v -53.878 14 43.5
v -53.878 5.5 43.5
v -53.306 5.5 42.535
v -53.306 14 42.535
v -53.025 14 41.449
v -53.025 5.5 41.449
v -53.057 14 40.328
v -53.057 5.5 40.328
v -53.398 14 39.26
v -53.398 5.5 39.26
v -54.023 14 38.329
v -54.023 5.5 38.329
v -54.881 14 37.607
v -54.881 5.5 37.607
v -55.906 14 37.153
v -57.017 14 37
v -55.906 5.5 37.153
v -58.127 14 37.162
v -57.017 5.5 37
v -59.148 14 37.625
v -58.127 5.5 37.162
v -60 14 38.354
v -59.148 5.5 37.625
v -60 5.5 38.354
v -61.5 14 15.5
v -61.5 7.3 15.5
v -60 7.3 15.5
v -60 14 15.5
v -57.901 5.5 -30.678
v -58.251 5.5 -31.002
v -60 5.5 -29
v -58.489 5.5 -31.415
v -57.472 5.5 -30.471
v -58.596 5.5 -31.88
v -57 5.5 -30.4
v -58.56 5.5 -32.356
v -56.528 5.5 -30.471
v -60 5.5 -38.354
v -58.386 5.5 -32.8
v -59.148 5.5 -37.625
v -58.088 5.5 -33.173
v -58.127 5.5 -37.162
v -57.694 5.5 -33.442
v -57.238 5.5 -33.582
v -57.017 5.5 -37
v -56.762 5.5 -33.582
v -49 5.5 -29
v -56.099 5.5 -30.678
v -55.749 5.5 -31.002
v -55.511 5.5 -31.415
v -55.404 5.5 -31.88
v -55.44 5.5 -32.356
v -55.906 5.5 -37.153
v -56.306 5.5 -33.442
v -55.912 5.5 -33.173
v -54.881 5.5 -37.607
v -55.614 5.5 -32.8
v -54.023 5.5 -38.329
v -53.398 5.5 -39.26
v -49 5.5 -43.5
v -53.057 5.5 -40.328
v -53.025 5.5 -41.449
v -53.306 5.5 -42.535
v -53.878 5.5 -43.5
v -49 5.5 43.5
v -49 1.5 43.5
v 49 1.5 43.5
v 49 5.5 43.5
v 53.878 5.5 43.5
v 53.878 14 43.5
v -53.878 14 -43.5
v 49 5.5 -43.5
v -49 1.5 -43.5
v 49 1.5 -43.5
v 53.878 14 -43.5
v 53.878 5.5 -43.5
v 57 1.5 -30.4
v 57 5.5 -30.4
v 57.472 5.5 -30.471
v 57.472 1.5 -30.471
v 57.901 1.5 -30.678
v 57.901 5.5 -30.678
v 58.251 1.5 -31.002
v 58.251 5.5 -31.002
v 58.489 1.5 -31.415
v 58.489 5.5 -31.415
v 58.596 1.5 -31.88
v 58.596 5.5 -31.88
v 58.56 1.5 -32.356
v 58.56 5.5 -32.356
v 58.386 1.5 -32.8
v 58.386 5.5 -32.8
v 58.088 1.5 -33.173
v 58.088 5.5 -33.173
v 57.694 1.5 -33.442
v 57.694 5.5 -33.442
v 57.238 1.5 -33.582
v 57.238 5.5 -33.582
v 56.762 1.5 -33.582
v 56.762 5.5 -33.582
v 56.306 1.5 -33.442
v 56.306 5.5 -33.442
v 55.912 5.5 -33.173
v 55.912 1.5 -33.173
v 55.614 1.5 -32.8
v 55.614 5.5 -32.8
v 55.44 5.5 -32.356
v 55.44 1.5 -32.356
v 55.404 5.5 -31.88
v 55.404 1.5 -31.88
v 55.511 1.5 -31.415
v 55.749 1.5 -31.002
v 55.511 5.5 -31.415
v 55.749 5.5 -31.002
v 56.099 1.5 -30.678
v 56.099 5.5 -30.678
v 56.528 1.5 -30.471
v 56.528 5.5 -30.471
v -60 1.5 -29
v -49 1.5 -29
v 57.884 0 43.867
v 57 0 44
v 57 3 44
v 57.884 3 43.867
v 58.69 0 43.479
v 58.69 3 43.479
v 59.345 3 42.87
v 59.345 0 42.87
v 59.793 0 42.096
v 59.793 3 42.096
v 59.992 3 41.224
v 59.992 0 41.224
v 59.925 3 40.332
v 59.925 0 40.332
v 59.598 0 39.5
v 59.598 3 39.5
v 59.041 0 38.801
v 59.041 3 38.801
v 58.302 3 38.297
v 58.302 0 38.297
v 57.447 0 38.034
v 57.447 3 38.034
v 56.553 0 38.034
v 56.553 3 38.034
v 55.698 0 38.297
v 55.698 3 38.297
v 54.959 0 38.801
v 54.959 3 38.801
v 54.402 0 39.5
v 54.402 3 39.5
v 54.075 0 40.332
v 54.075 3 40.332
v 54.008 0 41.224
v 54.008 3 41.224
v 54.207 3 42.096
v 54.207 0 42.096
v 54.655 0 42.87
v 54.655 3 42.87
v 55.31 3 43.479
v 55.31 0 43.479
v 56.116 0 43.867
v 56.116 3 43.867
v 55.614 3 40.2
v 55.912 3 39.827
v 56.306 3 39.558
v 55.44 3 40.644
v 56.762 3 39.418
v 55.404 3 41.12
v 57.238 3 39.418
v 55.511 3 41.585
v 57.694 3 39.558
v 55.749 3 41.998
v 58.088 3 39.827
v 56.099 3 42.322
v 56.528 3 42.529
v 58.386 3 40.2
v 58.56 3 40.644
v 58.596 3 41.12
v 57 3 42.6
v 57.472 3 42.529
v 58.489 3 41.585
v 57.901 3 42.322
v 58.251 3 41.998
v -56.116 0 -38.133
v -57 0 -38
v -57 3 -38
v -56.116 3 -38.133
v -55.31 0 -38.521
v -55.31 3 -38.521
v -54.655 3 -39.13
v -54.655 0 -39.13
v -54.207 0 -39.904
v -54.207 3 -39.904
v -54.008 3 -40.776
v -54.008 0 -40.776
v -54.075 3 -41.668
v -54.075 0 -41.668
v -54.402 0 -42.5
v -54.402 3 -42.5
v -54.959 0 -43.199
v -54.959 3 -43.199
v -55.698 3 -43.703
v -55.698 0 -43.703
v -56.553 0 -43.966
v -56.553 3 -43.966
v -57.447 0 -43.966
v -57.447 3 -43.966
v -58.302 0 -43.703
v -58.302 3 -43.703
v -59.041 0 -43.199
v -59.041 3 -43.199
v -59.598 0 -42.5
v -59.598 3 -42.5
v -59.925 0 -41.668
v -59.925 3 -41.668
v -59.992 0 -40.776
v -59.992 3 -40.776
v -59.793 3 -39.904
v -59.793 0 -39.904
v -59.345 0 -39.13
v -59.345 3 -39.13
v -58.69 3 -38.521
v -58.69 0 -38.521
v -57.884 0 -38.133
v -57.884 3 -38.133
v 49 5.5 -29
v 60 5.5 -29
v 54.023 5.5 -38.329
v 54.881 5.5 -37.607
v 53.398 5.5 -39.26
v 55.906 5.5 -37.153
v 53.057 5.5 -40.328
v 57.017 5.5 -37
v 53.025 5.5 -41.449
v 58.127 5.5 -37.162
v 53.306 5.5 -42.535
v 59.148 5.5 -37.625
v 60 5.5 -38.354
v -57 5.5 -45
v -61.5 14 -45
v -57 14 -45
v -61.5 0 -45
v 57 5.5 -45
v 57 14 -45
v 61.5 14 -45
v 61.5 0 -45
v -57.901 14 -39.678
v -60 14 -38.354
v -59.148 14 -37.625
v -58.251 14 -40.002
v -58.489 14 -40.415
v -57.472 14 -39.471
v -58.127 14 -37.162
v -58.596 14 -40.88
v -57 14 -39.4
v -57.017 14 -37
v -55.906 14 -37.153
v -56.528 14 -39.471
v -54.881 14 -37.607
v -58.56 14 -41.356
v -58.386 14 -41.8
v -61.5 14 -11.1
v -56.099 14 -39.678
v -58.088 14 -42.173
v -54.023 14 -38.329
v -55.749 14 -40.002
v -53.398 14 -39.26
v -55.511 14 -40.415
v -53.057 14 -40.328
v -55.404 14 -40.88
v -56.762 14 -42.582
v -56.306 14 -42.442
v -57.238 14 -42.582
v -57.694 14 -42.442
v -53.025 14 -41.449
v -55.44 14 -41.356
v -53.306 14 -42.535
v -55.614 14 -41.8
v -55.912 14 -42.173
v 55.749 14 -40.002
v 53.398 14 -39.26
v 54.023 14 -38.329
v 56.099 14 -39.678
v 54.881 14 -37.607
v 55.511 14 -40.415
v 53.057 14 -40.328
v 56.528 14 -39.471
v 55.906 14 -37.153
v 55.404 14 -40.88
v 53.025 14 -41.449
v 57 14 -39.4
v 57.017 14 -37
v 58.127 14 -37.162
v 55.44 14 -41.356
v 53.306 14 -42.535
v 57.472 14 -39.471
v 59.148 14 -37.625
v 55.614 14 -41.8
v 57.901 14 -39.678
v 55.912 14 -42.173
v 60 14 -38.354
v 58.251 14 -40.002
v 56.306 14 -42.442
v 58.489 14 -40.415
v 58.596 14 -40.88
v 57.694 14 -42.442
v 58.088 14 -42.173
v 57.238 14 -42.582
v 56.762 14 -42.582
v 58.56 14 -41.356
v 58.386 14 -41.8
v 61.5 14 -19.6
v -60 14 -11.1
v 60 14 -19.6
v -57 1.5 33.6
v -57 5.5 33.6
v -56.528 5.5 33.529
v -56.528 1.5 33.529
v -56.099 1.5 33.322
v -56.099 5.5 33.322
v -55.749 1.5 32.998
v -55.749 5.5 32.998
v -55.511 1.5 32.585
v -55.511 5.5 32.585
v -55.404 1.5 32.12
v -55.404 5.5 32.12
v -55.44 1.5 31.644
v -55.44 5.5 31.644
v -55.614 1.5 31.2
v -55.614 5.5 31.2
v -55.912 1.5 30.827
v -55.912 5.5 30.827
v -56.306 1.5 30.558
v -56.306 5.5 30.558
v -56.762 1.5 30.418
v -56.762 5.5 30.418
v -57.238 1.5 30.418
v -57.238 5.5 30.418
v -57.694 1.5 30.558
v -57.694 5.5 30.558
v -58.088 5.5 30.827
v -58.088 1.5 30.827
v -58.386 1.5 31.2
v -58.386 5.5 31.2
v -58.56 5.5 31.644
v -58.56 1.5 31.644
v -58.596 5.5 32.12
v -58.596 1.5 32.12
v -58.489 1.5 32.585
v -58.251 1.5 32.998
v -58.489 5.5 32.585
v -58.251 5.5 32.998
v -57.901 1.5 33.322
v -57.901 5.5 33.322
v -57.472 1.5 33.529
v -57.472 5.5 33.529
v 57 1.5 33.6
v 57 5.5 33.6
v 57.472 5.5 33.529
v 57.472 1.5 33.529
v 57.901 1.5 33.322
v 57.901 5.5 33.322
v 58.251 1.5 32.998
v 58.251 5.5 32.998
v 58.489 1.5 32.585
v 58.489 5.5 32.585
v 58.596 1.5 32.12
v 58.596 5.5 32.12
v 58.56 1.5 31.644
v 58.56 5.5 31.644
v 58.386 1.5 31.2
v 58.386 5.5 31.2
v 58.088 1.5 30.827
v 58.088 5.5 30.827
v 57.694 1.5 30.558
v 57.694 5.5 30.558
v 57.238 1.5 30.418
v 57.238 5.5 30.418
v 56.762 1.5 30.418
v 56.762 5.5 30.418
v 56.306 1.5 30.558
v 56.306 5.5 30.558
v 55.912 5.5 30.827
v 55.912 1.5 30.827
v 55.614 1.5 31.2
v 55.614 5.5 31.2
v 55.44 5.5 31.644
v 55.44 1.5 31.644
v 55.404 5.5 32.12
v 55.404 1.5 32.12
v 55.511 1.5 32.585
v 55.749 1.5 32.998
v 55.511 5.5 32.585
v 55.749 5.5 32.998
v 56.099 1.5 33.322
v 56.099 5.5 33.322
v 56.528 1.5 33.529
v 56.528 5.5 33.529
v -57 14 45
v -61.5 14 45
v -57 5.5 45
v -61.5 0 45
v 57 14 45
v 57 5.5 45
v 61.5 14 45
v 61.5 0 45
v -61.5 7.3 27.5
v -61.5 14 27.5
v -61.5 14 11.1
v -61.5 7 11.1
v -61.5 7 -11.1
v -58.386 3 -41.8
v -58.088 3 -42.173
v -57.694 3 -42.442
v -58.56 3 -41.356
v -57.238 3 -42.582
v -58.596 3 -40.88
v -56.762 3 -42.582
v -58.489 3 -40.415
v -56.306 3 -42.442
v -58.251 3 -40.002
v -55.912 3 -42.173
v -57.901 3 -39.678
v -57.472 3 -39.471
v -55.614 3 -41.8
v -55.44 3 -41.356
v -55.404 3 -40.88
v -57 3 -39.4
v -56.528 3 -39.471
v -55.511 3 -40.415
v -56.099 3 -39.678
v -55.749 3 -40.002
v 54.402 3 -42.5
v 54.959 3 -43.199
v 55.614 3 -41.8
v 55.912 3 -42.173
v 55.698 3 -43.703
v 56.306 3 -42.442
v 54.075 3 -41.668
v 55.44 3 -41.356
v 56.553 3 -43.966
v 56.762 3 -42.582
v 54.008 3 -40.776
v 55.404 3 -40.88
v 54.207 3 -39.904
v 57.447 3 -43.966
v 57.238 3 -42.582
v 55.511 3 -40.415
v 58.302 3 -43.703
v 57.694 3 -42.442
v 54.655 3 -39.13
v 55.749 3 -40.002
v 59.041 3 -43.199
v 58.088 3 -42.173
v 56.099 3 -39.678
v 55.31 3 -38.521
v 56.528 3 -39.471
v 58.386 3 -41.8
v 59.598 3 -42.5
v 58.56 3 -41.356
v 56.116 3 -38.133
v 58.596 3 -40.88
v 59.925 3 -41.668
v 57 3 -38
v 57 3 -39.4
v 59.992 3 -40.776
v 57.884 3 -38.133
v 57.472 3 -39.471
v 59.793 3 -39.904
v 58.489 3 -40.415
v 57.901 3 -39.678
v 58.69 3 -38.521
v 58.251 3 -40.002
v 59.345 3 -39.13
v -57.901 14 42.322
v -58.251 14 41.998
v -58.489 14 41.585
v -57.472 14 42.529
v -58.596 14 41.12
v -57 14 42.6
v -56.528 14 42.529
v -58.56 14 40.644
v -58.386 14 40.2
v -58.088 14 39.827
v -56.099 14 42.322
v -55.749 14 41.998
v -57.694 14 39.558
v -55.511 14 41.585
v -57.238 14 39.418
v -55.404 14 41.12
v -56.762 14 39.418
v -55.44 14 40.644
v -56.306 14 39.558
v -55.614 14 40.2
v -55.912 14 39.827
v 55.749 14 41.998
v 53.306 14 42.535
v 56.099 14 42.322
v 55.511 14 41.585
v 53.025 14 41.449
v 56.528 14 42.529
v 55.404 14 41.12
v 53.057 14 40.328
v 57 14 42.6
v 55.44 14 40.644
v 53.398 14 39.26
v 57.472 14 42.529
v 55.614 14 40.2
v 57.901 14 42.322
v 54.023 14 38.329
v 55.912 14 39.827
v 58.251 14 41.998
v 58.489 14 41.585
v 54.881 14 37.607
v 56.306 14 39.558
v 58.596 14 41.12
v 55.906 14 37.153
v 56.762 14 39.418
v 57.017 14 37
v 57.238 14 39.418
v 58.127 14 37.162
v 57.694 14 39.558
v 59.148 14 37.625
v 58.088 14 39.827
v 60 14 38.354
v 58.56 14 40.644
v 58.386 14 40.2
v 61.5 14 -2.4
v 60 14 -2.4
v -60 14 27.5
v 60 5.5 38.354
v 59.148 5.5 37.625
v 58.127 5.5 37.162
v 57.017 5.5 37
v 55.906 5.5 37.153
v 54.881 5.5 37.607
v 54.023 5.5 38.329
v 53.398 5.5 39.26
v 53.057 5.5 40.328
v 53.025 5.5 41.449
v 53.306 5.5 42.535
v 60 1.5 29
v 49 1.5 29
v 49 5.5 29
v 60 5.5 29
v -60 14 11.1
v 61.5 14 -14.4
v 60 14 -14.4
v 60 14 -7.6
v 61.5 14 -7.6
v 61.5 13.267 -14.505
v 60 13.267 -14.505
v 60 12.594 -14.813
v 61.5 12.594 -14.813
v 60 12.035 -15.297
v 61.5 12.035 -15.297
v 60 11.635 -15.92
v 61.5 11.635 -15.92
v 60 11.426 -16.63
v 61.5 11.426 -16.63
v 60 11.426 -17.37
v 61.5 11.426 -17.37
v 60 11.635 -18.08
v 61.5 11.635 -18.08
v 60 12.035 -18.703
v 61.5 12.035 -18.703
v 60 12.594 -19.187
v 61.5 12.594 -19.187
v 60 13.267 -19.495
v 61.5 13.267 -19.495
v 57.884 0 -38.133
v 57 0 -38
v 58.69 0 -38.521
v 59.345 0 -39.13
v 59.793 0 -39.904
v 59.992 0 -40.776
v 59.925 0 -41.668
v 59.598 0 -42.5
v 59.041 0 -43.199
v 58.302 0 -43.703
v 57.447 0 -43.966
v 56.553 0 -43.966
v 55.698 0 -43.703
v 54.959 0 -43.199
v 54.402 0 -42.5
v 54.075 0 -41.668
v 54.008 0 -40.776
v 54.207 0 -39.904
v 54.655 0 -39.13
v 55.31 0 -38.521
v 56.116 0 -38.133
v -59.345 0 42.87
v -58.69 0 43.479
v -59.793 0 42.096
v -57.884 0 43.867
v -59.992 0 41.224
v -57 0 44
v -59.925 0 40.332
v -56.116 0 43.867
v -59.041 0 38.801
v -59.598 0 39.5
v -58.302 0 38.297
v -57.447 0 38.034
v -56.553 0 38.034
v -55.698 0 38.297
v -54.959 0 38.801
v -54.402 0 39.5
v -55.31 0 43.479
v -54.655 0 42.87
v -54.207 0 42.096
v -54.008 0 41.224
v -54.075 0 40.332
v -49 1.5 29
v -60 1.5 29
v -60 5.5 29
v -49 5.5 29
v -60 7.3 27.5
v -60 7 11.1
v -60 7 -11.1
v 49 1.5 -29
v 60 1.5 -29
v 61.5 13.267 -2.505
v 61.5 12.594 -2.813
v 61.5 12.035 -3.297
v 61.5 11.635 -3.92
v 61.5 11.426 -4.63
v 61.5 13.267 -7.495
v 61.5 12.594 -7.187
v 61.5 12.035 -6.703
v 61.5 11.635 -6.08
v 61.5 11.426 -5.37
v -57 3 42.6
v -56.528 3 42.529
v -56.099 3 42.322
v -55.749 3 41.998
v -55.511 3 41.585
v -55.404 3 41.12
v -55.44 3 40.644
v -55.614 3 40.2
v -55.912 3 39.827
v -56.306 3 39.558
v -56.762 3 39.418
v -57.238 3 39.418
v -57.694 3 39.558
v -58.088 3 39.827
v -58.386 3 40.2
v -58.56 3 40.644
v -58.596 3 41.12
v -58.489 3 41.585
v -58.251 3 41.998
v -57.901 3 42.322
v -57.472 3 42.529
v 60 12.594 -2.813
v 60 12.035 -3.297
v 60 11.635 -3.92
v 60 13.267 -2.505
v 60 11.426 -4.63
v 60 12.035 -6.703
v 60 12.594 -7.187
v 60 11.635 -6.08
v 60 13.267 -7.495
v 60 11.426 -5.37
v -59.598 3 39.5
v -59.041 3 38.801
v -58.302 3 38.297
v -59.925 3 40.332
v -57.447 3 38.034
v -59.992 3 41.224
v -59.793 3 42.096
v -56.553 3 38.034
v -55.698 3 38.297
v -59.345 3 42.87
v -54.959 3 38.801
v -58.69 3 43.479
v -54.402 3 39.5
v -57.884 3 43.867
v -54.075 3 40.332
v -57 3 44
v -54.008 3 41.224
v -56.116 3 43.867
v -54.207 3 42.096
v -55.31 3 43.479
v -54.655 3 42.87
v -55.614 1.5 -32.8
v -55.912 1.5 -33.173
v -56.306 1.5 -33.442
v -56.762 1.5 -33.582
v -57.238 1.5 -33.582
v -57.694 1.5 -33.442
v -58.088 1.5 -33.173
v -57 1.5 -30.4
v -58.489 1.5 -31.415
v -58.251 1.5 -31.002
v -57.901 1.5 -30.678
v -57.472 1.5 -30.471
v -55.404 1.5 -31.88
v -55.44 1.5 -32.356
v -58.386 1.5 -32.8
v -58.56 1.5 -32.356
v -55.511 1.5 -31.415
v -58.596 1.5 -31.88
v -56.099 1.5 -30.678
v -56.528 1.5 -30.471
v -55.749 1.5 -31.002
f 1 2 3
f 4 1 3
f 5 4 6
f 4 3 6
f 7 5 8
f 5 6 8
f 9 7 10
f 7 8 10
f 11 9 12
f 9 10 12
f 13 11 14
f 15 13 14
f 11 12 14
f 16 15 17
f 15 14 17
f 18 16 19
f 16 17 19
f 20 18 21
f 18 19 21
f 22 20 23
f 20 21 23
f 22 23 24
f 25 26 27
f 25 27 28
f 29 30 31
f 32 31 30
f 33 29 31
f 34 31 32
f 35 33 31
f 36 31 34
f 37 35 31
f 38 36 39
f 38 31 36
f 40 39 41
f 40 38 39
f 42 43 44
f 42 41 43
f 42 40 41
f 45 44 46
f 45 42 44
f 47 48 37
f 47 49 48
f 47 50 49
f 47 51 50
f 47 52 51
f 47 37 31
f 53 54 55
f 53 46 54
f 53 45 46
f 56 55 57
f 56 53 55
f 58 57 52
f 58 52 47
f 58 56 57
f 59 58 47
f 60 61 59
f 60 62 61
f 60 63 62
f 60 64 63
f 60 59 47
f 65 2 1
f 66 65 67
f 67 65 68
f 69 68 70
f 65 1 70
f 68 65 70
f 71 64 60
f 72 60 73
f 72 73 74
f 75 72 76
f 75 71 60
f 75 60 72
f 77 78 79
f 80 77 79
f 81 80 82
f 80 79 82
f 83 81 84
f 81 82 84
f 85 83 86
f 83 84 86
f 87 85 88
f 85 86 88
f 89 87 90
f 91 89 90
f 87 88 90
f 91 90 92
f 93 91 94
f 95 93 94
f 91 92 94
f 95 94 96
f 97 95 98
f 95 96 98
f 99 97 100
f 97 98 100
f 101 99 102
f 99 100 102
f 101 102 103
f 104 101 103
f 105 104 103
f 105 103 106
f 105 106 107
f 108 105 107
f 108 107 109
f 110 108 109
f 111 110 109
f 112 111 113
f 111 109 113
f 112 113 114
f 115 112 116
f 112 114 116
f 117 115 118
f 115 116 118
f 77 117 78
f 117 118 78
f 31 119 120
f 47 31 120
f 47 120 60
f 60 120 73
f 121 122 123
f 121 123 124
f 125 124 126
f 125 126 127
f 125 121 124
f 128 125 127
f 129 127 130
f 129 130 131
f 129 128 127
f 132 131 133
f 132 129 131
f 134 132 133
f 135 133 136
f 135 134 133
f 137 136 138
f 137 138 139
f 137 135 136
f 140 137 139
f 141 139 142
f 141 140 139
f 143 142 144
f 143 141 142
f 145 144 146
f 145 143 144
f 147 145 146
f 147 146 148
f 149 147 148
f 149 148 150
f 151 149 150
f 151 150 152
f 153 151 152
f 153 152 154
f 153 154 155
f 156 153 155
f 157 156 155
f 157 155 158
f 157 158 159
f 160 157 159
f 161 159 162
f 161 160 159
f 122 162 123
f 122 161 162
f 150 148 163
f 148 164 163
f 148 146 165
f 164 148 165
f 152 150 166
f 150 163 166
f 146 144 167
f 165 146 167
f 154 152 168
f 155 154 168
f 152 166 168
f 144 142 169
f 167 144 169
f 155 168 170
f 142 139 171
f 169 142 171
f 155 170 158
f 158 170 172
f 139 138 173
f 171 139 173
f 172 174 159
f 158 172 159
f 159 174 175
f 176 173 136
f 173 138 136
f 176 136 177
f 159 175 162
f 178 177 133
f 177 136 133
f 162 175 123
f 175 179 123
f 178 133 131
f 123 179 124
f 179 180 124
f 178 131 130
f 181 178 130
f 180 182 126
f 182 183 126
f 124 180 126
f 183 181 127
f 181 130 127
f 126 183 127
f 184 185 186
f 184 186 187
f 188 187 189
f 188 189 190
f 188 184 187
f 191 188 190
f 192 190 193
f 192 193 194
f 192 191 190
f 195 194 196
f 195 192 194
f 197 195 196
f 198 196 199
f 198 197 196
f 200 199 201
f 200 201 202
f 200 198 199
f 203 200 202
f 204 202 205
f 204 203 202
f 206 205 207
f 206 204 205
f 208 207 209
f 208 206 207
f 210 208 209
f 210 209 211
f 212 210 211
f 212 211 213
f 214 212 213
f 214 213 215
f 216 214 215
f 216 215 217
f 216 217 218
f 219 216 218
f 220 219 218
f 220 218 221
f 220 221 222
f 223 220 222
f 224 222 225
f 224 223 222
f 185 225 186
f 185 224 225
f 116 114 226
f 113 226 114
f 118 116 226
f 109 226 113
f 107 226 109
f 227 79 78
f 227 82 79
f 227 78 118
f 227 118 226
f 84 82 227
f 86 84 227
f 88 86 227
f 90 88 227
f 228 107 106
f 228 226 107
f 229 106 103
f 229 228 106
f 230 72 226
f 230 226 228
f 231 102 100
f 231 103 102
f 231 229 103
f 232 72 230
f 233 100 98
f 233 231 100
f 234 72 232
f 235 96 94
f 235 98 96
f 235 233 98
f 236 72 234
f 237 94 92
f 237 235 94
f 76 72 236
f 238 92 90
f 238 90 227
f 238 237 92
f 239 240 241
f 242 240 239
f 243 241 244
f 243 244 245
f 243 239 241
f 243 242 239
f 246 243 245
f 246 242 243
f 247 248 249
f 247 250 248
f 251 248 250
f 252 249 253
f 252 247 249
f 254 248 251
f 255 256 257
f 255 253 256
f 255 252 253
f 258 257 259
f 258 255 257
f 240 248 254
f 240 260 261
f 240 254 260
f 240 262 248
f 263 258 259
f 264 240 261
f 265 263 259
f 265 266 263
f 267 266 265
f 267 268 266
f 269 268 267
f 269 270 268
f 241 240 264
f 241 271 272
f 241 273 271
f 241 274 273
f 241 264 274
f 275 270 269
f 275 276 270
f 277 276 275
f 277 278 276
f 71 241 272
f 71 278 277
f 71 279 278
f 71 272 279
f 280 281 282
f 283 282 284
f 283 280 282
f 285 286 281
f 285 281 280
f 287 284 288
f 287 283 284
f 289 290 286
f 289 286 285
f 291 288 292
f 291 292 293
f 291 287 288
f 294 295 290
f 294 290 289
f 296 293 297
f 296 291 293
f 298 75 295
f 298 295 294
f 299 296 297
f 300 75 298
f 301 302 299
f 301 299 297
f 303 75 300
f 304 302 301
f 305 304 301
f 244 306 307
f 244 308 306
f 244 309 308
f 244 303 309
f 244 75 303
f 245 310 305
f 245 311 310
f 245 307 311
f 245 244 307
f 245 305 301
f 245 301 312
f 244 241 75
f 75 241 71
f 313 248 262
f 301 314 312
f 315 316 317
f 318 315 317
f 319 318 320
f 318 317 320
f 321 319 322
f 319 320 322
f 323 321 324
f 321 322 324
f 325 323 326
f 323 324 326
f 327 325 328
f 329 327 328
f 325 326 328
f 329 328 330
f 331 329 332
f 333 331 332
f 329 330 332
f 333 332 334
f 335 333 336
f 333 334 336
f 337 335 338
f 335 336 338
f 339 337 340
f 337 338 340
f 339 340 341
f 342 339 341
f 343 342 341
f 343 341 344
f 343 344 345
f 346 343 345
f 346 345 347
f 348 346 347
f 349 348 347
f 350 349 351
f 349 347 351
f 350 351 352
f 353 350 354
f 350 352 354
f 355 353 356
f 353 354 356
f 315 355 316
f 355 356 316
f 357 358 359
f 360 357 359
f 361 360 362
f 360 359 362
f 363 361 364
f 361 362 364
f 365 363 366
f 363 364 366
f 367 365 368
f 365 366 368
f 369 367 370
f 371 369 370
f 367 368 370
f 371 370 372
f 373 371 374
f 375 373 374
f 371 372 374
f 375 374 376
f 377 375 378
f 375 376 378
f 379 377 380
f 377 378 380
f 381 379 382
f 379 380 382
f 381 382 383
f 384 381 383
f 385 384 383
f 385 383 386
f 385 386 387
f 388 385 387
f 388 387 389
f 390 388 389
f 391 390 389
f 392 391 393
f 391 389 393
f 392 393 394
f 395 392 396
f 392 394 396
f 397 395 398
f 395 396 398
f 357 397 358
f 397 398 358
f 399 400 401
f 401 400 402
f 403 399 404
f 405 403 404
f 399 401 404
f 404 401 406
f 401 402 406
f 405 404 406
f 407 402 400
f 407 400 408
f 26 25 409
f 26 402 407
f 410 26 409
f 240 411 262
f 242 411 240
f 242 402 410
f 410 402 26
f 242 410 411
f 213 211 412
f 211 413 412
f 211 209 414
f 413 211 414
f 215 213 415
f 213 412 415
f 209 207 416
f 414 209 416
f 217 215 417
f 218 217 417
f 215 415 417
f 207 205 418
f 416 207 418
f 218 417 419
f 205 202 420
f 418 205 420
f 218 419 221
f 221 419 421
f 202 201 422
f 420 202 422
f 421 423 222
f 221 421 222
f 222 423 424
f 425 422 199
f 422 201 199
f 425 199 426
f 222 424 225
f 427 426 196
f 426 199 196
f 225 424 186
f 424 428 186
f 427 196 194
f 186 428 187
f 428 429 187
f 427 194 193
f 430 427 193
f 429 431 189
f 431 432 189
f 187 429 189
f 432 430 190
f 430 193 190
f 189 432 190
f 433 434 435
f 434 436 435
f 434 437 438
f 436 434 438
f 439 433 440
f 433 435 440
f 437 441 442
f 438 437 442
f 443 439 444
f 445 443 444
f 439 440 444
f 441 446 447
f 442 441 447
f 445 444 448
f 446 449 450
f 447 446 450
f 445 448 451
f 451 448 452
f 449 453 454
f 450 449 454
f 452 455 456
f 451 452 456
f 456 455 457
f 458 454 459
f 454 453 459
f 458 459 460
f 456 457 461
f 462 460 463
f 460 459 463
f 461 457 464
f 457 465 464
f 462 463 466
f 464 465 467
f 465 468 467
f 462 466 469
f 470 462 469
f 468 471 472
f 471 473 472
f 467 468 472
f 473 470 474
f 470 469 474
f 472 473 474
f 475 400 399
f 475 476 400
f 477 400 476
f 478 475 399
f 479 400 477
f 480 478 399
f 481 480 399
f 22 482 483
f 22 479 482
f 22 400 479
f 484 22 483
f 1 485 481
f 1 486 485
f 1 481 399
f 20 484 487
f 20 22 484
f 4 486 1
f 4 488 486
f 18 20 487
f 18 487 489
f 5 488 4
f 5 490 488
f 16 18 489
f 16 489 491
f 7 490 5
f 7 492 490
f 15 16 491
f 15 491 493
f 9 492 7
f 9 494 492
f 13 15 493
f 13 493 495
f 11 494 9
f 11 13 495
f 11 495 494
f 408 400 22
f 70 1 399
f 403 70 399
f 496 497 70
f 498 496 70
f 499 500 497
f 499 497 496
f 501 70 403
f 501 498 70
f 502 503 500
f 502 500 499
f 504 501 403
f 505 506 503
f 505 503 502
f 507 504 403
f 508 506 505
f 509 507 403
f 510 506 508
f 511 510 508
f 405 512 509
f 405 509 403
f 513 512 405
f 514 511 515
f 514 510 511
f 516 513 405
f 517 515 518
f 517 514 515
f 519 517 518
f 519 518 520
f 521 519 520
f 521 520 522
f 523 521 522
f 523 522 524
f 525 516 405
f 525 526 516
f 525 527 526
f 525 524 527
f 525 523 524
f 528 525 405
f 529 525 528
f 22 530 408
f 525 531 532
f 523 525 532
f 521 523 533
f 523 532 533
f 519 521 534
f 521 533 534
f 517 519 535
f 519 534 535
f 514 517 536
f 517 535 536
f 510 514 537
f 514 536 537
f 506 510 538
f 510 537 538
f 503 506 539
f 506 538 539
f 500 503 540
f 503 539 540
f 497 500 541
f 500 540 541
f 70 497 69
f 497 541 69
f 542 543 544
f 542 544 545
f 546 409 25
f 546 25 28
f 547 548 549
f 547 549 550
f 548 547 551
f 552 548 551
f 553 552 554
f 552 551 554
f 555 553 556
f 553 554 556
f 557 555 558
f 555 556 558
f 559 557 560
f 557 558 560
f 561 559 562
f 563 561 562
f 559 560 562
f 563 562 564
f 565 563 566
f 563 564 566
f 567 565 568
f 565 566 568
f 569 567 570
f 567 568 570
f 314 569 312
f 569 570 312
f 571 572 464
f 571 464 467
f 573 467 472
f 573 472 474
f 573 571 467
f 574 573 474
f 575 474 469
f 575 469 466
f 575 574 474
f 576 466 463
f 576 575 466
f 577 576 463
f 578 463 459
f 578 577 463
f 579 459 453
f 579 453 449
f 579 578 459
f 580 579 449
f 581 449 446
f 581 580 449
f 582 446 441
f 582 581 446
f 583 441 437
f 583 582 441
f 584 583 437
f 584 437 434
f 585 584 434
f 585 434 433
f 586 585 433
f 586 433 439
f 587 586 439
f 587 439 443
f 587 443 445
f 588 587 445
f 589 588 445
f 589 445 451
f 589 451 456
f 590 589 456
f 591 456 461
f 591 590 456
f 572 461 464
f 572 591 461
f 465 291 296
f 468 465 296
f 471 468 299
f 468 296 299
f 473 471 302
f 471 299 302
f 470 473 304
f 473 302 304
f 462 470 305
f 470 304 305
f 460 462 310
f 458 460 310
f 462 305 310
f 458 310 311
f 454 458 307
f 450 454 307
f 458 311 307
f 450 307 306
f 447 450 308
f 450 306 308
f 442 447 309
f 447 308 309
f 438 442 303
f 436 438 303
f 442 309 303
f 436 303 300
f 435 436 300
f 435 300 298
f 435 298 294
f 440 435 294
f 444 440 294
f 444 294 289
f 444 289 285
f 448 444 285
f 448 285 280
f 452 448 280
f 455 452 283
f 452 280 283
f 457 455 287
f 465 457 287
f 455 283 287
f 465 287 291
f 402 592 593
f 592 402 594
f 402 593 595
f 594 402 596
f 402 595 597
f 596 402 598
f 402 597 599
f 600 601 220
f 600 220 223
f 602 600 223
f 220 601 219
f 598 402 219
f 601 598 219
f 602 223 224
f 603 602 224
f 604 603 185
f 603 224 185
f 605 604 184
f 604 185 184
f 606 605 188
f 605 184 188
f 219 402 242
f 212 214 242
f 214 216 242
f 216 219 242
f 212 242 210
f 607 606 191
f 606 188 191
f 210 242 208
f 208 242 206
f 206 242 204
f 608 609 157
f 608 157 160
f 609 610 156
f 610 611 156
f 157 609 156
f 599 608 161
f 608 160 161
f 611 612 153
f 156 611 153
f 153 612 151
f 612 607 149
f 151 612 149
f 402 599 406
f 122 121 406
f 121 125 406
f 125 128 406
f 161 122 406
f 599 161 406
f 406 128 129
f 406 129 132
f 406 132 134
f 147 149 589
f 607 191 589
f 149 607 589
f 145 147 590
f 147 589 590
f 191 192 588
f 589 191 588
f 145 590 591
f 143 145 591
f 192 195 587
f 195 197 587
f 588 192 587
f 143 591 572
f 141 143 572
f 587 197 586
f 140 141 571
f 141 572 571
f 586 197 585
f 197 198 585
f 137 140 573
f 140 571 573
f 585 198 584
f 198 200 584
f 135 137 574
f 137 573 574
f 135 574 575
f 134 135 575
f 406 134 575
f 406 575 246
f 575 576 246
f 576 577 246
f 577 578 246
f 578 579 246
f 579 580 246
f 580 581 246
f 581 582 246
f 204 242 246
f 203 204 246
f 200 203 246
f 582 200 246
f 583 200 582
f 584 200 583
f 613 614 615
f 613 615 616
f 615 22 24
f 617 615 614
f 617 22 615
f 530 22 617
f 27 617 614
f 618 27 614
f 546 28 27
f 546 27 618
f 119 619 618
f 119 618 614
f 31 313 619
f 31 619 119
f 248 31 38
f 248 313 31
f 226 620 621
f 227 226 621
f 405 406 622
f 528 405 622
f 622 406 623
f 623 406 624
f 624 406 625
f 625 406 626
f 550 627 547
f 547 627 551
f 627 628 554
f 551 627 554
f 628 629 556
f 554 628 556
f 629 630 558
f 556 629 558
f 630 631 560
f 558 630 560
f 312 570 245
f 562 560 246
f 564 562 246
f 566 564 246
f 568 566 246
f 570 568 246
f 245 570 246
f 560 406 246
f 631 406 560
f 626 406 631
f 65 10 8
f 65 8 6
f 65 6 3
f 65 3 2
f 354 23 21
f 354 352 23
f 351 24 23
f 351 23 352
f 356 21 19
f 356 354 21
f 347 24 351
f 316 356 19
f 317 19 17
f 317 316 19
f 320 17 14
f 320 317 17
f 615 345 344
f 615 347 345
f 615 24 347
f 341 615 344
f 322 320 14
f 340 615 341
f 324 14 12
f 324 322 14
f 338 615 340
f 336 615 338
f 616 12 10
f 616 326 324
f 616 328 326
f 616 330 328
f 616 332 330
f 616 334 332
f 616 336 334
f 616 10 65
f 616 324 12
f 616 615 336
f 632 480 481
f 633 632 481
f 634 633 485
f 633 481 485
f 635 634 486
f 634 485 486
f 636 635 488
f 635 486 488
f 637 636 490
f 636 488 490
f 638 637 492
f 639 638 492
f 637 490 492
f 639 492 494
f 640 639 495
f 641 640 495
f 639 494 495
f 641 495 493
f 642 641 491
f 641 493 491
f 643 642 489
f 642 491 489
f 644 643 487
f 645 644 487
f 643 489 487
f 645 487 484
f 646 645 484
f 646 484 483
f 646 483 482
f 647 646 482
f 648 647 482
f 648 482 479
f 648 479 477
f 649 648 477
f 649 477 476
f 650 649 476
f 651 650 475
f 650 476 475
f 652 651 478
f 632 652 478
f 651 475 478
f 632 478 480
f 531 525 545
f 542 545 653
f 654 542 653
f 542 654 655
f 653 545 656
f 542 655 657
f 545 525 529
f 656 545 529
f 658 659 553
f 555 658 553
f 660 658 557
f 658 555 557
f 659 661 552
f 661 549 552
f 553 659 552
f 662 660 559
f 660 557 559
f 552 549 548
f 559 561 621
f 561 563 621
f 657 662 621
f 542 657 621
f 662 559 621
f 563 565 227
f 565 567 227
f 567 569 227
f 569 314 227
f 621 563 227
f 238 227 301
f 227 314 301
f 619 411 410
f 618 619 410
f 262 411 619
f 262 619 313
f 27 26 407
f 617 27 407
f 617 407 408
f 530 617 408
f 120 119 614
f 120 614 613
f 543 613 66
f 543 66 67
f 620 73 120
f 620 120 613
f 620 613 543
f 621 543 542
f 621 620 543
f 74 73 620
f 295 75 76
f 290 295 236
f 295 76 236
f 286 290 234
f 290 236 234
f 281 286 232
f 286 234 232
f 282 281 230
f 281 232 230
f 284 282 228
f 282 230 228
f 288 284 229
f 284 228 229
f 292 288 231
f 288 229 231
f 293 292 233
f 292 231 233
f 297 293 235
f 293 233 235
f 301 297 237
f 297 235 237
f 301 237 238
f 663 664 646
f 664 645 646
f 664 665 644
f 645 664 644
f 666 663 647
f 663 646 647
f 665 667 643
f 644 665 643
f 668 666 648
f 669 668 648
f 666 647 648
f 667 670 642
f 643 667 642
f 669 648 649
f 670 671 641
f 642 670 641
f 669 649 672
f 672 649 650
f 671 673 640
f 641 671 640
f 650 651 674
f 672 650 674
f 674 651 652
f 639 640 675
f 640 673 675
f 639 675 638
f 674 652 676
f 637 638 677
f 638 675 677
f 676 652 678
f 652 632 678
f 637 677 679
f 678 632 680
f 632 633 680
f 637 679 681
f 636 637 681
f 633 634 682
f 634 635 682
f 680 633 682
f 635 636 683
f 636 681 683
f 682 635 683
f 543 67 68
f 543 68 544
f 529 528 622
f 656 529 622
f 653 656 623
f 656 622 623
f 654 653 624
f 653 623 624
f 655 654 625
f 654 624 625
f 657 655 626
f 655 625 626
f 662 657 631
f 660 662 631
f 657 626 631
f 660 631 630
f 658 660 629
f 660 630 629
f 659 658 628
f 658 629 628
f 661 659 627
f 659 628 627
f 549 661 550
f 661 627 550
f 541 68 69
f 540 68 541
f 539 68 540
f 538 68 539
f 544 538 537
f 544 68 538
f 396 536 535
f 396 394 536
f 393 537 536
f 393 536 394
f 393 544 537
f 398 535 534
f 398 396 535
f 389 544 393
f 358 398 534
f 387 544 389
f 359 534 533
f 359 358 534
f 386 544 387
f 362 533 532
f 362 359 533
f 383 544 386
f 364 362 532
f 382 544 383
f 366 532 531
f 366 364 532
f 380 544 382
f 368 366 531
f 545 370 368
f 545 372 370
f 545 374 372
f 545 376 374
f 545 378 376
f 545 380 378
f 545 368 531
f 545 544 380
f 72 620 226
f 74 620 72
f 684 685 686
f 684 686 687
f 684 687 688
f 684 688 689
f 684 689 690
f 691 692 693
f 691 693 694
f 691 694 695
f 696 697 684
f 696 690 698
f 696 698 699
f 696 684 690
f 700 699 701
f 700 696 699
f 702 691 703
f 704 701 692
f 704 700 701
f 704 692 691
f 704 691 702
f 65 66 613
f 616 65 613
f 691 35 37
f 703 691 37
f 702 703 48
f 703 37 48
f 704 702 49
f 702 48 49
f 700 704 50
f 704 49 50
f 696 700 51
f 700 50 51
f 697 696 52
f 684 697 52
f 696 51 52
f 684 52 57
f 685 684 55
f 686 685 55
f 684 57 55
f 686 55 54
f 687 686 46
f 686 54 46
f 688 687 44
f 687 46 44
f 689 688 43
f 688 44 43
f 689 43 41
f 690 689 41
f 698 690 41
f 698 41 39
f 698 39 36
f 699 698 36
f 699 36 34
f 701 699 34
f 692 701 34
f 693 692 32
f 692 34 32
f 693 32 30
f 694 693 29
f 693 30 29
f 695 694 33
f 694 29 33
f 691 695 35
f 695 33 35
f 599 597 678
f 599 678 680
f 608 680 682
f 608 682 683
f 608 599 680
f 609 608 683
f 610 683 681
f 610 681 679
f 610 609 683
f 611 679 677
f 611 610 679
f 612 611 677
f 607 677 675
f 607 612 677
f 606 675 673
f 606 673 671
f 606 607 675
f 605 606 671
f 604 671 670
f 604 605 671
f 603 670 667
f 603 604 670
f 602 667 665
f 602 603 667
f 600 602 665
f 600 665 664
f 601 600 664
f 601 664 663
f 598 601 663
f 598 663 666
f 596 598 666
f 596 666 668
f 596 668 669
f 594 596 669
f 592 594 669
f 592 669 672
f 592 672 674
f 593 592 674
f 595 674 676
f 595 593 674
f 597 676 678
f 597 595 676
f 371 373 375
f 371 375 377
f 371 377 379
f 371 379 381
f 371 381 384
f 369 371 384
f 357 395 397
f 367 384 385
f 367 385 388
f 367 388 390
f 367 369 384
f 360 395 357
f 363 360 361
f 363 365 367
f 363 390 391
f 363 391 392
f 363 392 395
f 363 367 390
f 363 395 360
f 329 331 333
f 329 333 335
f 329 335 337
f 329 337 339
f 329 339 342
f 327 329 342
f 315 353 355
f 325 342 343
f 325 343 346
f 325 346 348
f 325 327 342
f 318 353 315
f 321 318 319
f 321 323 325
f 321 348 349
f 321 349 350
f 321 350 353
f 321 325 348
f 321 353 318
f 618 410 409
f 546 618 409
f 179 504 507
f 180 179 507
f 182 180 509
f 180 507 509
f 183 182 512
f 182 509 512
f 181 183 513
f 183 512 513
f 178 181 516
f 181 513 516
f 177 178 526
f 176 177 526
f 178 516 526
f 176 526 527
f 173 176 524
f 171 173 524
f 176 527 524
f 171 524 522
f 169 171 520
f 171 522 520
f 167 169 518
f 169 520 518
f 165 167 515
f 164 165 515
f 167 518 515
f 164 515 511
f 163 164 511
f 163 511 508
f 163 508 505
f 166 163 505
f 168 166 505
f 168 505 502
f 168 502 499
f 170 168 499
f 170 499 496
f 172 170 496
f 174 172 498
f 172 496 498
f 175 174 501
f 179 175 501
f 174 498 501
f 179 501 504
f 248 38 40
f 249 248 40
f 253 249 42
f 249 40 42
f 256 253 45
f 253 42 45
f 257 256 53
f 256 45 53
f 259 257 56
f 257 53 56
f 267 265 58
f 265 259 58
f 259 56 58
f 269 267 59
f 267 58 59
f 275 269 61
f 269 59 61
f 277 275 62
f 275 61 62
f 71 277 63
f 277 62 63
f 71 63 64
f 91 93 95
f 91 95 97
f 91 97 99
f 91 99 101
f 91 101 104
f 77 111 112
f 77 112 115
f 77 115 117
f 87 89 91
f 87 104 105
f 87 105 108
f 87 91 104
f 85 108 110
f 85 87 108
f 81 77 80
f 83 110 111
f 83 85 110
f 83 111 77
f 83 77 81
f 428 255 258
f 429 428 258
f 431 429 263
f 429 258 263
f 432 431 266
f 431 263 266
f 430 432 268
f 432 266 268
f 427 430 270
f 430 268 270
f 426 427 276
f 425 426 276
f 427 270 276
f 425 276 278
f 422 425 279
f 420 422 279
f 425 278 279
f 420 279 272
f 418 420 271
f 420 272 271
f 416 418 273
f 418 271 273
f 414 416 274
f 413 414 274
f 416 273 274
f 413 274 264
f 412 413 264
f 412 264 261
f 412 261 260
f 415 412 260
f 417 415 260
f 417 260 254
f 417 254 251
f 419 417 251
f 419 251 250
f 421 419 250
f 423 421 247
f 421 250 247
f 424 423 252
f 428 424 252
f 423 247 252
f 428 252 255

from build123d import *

# Parameters (mm, degrees)
SKETCH_1_W          = 123
SKETCH_1_H          = 90
EXTRUDE_1_DEPTH     = 14
SKETCH_2_W          = 120
SKETCH_2_H          = 87
CUT_EXTRUDE_1_DEPTH = 12.5
SKETCH_3_W          = 12.5
SKETCH_3_H          = 16
EXTRUDE_2_DEPTH     = 4
SKETCH_4_R          = 4
EXTRUDE_3_DEPTH     = 8.5
SKETCH_5_R          = 3
CUT_EXTRUDE_2_DEPTH = 3
SKETCH_6_R          = 1.6
CUT_EXTRUDE_3_DEPTH = 11
SKETCH_7_R          = 2.6
CUT_EXTRUDE_4_DEPTH = 1.5
SKETCH_8_W          = 22.2
SKETCH_8_H          = 7
SKETCH_8_W_2        = 12
SKETCH_8_H_2        = 6.7
CUT_EXTRUDE_5_DEPTH = 1.5
SKETCH_9_R          = 1.6
CUT_EXTRUDE_6_DEPTH = 4


with BuildPart() as part:
    # Эскиз1 → Бобышка-Вытянуть1 (new body)
    with BuildSketch(Plane(origin=(0, 0, 0), x_dir=(1, 0, 0), z_dir=(0, 1, 0))):
        Rectangle(SKETCH_1_W, SKETCH_1_H)
    extrude(amount=EXTRUDE_1_DEPTH)

    # Эскиз2 → Вырез-Вытянуть1 (cut)
    with BuildSketch(Plane(origin=(0, 14, 0), x_dir=(1, 0, 0), z_dir=(0, 1, 0))):
        Rectangle(SKETCH_2_W, SKETCH_2_H)
    extrude(amount=-CUT_EXTRUDE_1_DEPTH, mode=Mode.SUBTRACT)

    # Эскиз3 → Бобышка-Вытянуть2 (add)
    with BuildSketch(Plane(origin=(0, 1.5, 0), x_dir=(1, 0, 0), z_dir=(0, 1, 0))):
        with Locations((-55.25, 37)):
            Rectangle(SKETCH_3_W, SKETCH_3_H)
        with Locations((55.25, 37)):
            Rectangle(SKETCH_3_W, SKETCH_3_H)
        with Locations((55.25, -37)):
            Rectangle(SKETCH_3_W, SKETCH_3_H)
        with Locations((-55.25, -37)):
            Rectangle(SKETCH_3_W, SKETCH_3_H)
    extrude(amount=EXTRUDE_2_DEPTH)

    # Эскиз4 → Бобышка-Вытянуть3 (add)
    with BuildSketch(Plane(origin=(0, 5.5, 0), x_dir=(1, 0, 0), z_dir=(0, 1, 0))):
        with Locations((-57, 41)):
            Circle(SKETCH_4_R)
        with Locations((57, 41)):
            Circle(SKETCH_4_R)
        with Locations((57, -41)):
            Circle(SKETCH_4_R)
        with Locations((-57, -41)):
            Circle(SKETCH_4_R)
    extrude(amount=EXTRUDE_3_DEPTH)

    # Эскиз5 → Вырез-Вытянуть2 (cut)
    with BuildSketch(Plane(origin=(0, 0, 0), x_dir=(1, 0, 0), z_dir=(0, 1, 0))):
        with Locations(Location((-57, 41, 0), (0, 0, 270))):
            Circle(SKETCH_5_R)
        with Locations(Location((57, 41, 0), (0, 0, 270))):
            Circle(SKETCH_5_R)
        with Locations(Location((57, -41, 0), (0, 0, 270))):
            Circle(SKETCH_5_R)
        with Locations(Location((-57, -41, 0), (0, 0, 270))):
            Circle(SKETCH_5_R)
    extrude(amount=CUT_EXTRUDE_2_DEPTH, mode=Mode.SUBTRACT)

    # Эскиз6 → Вырез-Вытянуть3 (cut)
    with BuildSketch(Plane(origin=(0, 14, 0), x_dir=(1, 0, 0), z_dir=(0, 1, 0))):
        with Locations(Location((-57, 41, 0), (0, 0, 270))):
            Circle(SKETCH_6_R)
        with Locations(Location((57, 41, 0), (0, 0, 270))):
            Circle(SKETCH_6_R)
        with Locations(Location((57, -41, 0), (0, 0, 270))):
            Circle(SKETCH_6_R)
        with Locations(Location((-57, -41, 0), (0, 0, 270))):
            Circle(SKETCH_6_R)
    extrude(amount=-CUT_EXTRUDE_3_DEPTH, mode=Mode.SUBTRACT)

    # Эскиз7 → Вырез-Вытянуть4 (cut)
    with BuildSketch(Plane(origin=(61.5, 0, 0), x_dir=(0, 0, -1), z_dir=(1, 0, 0))):
        with Locations((17, 14)):
            Circle(SKETCH_7_R)
        with Locations((5, 14)):
            Circle(SKETCH_7_R)
    extrude(amount=-CUT_EXTRUDE_4_DEPTH, mode=Mode.SUBTRACT)

    # Эскиз8 → Вырез-Вытянуть5 (cut)
    with BuildSketch(Plane.ZY.offset(61.5)):
        with Locations((0, 10.5)):
            Rectangle(SKETCH_8_W, SKETCH_8_H)
        with Locations((21.5, 10.65)):
            Rectangle(SKETCH_8_W_2, SKETCH_8_H_2)
    extrude(amount=-CUT_EXTRUDE_5_DEPTH, mode=Mode.SUBTRACT)

    # Эскиз9 → Вырез-Вытянуть6 (cut)
    with BuildSketch(Plane(origin=(0, 5.5, 0), x_dir=(-1, 0, 0), z_dir=(0, 1, 0))):
        with Locations(Location((57, 32, 0), (0, 0, 90))):
            Circle(SKETCH_9_R)
        with Locations(Location((57, -32, 0), (0, 0, 90))):
            Circle(SKETCH_9_R)
        with Locations(Location((-57, -32, 0), (0, 0, 90))):
            Circle(SKETCH_9_R)
        with Locations(Location((-57, 32, 0), (0, 0, 90))):
            Circle(SKETCH_9_R)
    extrude(amount=-CUT_EXTRUDE_6_DEPTH, mode=Mode.SUBTRACT)


solid = part.part
